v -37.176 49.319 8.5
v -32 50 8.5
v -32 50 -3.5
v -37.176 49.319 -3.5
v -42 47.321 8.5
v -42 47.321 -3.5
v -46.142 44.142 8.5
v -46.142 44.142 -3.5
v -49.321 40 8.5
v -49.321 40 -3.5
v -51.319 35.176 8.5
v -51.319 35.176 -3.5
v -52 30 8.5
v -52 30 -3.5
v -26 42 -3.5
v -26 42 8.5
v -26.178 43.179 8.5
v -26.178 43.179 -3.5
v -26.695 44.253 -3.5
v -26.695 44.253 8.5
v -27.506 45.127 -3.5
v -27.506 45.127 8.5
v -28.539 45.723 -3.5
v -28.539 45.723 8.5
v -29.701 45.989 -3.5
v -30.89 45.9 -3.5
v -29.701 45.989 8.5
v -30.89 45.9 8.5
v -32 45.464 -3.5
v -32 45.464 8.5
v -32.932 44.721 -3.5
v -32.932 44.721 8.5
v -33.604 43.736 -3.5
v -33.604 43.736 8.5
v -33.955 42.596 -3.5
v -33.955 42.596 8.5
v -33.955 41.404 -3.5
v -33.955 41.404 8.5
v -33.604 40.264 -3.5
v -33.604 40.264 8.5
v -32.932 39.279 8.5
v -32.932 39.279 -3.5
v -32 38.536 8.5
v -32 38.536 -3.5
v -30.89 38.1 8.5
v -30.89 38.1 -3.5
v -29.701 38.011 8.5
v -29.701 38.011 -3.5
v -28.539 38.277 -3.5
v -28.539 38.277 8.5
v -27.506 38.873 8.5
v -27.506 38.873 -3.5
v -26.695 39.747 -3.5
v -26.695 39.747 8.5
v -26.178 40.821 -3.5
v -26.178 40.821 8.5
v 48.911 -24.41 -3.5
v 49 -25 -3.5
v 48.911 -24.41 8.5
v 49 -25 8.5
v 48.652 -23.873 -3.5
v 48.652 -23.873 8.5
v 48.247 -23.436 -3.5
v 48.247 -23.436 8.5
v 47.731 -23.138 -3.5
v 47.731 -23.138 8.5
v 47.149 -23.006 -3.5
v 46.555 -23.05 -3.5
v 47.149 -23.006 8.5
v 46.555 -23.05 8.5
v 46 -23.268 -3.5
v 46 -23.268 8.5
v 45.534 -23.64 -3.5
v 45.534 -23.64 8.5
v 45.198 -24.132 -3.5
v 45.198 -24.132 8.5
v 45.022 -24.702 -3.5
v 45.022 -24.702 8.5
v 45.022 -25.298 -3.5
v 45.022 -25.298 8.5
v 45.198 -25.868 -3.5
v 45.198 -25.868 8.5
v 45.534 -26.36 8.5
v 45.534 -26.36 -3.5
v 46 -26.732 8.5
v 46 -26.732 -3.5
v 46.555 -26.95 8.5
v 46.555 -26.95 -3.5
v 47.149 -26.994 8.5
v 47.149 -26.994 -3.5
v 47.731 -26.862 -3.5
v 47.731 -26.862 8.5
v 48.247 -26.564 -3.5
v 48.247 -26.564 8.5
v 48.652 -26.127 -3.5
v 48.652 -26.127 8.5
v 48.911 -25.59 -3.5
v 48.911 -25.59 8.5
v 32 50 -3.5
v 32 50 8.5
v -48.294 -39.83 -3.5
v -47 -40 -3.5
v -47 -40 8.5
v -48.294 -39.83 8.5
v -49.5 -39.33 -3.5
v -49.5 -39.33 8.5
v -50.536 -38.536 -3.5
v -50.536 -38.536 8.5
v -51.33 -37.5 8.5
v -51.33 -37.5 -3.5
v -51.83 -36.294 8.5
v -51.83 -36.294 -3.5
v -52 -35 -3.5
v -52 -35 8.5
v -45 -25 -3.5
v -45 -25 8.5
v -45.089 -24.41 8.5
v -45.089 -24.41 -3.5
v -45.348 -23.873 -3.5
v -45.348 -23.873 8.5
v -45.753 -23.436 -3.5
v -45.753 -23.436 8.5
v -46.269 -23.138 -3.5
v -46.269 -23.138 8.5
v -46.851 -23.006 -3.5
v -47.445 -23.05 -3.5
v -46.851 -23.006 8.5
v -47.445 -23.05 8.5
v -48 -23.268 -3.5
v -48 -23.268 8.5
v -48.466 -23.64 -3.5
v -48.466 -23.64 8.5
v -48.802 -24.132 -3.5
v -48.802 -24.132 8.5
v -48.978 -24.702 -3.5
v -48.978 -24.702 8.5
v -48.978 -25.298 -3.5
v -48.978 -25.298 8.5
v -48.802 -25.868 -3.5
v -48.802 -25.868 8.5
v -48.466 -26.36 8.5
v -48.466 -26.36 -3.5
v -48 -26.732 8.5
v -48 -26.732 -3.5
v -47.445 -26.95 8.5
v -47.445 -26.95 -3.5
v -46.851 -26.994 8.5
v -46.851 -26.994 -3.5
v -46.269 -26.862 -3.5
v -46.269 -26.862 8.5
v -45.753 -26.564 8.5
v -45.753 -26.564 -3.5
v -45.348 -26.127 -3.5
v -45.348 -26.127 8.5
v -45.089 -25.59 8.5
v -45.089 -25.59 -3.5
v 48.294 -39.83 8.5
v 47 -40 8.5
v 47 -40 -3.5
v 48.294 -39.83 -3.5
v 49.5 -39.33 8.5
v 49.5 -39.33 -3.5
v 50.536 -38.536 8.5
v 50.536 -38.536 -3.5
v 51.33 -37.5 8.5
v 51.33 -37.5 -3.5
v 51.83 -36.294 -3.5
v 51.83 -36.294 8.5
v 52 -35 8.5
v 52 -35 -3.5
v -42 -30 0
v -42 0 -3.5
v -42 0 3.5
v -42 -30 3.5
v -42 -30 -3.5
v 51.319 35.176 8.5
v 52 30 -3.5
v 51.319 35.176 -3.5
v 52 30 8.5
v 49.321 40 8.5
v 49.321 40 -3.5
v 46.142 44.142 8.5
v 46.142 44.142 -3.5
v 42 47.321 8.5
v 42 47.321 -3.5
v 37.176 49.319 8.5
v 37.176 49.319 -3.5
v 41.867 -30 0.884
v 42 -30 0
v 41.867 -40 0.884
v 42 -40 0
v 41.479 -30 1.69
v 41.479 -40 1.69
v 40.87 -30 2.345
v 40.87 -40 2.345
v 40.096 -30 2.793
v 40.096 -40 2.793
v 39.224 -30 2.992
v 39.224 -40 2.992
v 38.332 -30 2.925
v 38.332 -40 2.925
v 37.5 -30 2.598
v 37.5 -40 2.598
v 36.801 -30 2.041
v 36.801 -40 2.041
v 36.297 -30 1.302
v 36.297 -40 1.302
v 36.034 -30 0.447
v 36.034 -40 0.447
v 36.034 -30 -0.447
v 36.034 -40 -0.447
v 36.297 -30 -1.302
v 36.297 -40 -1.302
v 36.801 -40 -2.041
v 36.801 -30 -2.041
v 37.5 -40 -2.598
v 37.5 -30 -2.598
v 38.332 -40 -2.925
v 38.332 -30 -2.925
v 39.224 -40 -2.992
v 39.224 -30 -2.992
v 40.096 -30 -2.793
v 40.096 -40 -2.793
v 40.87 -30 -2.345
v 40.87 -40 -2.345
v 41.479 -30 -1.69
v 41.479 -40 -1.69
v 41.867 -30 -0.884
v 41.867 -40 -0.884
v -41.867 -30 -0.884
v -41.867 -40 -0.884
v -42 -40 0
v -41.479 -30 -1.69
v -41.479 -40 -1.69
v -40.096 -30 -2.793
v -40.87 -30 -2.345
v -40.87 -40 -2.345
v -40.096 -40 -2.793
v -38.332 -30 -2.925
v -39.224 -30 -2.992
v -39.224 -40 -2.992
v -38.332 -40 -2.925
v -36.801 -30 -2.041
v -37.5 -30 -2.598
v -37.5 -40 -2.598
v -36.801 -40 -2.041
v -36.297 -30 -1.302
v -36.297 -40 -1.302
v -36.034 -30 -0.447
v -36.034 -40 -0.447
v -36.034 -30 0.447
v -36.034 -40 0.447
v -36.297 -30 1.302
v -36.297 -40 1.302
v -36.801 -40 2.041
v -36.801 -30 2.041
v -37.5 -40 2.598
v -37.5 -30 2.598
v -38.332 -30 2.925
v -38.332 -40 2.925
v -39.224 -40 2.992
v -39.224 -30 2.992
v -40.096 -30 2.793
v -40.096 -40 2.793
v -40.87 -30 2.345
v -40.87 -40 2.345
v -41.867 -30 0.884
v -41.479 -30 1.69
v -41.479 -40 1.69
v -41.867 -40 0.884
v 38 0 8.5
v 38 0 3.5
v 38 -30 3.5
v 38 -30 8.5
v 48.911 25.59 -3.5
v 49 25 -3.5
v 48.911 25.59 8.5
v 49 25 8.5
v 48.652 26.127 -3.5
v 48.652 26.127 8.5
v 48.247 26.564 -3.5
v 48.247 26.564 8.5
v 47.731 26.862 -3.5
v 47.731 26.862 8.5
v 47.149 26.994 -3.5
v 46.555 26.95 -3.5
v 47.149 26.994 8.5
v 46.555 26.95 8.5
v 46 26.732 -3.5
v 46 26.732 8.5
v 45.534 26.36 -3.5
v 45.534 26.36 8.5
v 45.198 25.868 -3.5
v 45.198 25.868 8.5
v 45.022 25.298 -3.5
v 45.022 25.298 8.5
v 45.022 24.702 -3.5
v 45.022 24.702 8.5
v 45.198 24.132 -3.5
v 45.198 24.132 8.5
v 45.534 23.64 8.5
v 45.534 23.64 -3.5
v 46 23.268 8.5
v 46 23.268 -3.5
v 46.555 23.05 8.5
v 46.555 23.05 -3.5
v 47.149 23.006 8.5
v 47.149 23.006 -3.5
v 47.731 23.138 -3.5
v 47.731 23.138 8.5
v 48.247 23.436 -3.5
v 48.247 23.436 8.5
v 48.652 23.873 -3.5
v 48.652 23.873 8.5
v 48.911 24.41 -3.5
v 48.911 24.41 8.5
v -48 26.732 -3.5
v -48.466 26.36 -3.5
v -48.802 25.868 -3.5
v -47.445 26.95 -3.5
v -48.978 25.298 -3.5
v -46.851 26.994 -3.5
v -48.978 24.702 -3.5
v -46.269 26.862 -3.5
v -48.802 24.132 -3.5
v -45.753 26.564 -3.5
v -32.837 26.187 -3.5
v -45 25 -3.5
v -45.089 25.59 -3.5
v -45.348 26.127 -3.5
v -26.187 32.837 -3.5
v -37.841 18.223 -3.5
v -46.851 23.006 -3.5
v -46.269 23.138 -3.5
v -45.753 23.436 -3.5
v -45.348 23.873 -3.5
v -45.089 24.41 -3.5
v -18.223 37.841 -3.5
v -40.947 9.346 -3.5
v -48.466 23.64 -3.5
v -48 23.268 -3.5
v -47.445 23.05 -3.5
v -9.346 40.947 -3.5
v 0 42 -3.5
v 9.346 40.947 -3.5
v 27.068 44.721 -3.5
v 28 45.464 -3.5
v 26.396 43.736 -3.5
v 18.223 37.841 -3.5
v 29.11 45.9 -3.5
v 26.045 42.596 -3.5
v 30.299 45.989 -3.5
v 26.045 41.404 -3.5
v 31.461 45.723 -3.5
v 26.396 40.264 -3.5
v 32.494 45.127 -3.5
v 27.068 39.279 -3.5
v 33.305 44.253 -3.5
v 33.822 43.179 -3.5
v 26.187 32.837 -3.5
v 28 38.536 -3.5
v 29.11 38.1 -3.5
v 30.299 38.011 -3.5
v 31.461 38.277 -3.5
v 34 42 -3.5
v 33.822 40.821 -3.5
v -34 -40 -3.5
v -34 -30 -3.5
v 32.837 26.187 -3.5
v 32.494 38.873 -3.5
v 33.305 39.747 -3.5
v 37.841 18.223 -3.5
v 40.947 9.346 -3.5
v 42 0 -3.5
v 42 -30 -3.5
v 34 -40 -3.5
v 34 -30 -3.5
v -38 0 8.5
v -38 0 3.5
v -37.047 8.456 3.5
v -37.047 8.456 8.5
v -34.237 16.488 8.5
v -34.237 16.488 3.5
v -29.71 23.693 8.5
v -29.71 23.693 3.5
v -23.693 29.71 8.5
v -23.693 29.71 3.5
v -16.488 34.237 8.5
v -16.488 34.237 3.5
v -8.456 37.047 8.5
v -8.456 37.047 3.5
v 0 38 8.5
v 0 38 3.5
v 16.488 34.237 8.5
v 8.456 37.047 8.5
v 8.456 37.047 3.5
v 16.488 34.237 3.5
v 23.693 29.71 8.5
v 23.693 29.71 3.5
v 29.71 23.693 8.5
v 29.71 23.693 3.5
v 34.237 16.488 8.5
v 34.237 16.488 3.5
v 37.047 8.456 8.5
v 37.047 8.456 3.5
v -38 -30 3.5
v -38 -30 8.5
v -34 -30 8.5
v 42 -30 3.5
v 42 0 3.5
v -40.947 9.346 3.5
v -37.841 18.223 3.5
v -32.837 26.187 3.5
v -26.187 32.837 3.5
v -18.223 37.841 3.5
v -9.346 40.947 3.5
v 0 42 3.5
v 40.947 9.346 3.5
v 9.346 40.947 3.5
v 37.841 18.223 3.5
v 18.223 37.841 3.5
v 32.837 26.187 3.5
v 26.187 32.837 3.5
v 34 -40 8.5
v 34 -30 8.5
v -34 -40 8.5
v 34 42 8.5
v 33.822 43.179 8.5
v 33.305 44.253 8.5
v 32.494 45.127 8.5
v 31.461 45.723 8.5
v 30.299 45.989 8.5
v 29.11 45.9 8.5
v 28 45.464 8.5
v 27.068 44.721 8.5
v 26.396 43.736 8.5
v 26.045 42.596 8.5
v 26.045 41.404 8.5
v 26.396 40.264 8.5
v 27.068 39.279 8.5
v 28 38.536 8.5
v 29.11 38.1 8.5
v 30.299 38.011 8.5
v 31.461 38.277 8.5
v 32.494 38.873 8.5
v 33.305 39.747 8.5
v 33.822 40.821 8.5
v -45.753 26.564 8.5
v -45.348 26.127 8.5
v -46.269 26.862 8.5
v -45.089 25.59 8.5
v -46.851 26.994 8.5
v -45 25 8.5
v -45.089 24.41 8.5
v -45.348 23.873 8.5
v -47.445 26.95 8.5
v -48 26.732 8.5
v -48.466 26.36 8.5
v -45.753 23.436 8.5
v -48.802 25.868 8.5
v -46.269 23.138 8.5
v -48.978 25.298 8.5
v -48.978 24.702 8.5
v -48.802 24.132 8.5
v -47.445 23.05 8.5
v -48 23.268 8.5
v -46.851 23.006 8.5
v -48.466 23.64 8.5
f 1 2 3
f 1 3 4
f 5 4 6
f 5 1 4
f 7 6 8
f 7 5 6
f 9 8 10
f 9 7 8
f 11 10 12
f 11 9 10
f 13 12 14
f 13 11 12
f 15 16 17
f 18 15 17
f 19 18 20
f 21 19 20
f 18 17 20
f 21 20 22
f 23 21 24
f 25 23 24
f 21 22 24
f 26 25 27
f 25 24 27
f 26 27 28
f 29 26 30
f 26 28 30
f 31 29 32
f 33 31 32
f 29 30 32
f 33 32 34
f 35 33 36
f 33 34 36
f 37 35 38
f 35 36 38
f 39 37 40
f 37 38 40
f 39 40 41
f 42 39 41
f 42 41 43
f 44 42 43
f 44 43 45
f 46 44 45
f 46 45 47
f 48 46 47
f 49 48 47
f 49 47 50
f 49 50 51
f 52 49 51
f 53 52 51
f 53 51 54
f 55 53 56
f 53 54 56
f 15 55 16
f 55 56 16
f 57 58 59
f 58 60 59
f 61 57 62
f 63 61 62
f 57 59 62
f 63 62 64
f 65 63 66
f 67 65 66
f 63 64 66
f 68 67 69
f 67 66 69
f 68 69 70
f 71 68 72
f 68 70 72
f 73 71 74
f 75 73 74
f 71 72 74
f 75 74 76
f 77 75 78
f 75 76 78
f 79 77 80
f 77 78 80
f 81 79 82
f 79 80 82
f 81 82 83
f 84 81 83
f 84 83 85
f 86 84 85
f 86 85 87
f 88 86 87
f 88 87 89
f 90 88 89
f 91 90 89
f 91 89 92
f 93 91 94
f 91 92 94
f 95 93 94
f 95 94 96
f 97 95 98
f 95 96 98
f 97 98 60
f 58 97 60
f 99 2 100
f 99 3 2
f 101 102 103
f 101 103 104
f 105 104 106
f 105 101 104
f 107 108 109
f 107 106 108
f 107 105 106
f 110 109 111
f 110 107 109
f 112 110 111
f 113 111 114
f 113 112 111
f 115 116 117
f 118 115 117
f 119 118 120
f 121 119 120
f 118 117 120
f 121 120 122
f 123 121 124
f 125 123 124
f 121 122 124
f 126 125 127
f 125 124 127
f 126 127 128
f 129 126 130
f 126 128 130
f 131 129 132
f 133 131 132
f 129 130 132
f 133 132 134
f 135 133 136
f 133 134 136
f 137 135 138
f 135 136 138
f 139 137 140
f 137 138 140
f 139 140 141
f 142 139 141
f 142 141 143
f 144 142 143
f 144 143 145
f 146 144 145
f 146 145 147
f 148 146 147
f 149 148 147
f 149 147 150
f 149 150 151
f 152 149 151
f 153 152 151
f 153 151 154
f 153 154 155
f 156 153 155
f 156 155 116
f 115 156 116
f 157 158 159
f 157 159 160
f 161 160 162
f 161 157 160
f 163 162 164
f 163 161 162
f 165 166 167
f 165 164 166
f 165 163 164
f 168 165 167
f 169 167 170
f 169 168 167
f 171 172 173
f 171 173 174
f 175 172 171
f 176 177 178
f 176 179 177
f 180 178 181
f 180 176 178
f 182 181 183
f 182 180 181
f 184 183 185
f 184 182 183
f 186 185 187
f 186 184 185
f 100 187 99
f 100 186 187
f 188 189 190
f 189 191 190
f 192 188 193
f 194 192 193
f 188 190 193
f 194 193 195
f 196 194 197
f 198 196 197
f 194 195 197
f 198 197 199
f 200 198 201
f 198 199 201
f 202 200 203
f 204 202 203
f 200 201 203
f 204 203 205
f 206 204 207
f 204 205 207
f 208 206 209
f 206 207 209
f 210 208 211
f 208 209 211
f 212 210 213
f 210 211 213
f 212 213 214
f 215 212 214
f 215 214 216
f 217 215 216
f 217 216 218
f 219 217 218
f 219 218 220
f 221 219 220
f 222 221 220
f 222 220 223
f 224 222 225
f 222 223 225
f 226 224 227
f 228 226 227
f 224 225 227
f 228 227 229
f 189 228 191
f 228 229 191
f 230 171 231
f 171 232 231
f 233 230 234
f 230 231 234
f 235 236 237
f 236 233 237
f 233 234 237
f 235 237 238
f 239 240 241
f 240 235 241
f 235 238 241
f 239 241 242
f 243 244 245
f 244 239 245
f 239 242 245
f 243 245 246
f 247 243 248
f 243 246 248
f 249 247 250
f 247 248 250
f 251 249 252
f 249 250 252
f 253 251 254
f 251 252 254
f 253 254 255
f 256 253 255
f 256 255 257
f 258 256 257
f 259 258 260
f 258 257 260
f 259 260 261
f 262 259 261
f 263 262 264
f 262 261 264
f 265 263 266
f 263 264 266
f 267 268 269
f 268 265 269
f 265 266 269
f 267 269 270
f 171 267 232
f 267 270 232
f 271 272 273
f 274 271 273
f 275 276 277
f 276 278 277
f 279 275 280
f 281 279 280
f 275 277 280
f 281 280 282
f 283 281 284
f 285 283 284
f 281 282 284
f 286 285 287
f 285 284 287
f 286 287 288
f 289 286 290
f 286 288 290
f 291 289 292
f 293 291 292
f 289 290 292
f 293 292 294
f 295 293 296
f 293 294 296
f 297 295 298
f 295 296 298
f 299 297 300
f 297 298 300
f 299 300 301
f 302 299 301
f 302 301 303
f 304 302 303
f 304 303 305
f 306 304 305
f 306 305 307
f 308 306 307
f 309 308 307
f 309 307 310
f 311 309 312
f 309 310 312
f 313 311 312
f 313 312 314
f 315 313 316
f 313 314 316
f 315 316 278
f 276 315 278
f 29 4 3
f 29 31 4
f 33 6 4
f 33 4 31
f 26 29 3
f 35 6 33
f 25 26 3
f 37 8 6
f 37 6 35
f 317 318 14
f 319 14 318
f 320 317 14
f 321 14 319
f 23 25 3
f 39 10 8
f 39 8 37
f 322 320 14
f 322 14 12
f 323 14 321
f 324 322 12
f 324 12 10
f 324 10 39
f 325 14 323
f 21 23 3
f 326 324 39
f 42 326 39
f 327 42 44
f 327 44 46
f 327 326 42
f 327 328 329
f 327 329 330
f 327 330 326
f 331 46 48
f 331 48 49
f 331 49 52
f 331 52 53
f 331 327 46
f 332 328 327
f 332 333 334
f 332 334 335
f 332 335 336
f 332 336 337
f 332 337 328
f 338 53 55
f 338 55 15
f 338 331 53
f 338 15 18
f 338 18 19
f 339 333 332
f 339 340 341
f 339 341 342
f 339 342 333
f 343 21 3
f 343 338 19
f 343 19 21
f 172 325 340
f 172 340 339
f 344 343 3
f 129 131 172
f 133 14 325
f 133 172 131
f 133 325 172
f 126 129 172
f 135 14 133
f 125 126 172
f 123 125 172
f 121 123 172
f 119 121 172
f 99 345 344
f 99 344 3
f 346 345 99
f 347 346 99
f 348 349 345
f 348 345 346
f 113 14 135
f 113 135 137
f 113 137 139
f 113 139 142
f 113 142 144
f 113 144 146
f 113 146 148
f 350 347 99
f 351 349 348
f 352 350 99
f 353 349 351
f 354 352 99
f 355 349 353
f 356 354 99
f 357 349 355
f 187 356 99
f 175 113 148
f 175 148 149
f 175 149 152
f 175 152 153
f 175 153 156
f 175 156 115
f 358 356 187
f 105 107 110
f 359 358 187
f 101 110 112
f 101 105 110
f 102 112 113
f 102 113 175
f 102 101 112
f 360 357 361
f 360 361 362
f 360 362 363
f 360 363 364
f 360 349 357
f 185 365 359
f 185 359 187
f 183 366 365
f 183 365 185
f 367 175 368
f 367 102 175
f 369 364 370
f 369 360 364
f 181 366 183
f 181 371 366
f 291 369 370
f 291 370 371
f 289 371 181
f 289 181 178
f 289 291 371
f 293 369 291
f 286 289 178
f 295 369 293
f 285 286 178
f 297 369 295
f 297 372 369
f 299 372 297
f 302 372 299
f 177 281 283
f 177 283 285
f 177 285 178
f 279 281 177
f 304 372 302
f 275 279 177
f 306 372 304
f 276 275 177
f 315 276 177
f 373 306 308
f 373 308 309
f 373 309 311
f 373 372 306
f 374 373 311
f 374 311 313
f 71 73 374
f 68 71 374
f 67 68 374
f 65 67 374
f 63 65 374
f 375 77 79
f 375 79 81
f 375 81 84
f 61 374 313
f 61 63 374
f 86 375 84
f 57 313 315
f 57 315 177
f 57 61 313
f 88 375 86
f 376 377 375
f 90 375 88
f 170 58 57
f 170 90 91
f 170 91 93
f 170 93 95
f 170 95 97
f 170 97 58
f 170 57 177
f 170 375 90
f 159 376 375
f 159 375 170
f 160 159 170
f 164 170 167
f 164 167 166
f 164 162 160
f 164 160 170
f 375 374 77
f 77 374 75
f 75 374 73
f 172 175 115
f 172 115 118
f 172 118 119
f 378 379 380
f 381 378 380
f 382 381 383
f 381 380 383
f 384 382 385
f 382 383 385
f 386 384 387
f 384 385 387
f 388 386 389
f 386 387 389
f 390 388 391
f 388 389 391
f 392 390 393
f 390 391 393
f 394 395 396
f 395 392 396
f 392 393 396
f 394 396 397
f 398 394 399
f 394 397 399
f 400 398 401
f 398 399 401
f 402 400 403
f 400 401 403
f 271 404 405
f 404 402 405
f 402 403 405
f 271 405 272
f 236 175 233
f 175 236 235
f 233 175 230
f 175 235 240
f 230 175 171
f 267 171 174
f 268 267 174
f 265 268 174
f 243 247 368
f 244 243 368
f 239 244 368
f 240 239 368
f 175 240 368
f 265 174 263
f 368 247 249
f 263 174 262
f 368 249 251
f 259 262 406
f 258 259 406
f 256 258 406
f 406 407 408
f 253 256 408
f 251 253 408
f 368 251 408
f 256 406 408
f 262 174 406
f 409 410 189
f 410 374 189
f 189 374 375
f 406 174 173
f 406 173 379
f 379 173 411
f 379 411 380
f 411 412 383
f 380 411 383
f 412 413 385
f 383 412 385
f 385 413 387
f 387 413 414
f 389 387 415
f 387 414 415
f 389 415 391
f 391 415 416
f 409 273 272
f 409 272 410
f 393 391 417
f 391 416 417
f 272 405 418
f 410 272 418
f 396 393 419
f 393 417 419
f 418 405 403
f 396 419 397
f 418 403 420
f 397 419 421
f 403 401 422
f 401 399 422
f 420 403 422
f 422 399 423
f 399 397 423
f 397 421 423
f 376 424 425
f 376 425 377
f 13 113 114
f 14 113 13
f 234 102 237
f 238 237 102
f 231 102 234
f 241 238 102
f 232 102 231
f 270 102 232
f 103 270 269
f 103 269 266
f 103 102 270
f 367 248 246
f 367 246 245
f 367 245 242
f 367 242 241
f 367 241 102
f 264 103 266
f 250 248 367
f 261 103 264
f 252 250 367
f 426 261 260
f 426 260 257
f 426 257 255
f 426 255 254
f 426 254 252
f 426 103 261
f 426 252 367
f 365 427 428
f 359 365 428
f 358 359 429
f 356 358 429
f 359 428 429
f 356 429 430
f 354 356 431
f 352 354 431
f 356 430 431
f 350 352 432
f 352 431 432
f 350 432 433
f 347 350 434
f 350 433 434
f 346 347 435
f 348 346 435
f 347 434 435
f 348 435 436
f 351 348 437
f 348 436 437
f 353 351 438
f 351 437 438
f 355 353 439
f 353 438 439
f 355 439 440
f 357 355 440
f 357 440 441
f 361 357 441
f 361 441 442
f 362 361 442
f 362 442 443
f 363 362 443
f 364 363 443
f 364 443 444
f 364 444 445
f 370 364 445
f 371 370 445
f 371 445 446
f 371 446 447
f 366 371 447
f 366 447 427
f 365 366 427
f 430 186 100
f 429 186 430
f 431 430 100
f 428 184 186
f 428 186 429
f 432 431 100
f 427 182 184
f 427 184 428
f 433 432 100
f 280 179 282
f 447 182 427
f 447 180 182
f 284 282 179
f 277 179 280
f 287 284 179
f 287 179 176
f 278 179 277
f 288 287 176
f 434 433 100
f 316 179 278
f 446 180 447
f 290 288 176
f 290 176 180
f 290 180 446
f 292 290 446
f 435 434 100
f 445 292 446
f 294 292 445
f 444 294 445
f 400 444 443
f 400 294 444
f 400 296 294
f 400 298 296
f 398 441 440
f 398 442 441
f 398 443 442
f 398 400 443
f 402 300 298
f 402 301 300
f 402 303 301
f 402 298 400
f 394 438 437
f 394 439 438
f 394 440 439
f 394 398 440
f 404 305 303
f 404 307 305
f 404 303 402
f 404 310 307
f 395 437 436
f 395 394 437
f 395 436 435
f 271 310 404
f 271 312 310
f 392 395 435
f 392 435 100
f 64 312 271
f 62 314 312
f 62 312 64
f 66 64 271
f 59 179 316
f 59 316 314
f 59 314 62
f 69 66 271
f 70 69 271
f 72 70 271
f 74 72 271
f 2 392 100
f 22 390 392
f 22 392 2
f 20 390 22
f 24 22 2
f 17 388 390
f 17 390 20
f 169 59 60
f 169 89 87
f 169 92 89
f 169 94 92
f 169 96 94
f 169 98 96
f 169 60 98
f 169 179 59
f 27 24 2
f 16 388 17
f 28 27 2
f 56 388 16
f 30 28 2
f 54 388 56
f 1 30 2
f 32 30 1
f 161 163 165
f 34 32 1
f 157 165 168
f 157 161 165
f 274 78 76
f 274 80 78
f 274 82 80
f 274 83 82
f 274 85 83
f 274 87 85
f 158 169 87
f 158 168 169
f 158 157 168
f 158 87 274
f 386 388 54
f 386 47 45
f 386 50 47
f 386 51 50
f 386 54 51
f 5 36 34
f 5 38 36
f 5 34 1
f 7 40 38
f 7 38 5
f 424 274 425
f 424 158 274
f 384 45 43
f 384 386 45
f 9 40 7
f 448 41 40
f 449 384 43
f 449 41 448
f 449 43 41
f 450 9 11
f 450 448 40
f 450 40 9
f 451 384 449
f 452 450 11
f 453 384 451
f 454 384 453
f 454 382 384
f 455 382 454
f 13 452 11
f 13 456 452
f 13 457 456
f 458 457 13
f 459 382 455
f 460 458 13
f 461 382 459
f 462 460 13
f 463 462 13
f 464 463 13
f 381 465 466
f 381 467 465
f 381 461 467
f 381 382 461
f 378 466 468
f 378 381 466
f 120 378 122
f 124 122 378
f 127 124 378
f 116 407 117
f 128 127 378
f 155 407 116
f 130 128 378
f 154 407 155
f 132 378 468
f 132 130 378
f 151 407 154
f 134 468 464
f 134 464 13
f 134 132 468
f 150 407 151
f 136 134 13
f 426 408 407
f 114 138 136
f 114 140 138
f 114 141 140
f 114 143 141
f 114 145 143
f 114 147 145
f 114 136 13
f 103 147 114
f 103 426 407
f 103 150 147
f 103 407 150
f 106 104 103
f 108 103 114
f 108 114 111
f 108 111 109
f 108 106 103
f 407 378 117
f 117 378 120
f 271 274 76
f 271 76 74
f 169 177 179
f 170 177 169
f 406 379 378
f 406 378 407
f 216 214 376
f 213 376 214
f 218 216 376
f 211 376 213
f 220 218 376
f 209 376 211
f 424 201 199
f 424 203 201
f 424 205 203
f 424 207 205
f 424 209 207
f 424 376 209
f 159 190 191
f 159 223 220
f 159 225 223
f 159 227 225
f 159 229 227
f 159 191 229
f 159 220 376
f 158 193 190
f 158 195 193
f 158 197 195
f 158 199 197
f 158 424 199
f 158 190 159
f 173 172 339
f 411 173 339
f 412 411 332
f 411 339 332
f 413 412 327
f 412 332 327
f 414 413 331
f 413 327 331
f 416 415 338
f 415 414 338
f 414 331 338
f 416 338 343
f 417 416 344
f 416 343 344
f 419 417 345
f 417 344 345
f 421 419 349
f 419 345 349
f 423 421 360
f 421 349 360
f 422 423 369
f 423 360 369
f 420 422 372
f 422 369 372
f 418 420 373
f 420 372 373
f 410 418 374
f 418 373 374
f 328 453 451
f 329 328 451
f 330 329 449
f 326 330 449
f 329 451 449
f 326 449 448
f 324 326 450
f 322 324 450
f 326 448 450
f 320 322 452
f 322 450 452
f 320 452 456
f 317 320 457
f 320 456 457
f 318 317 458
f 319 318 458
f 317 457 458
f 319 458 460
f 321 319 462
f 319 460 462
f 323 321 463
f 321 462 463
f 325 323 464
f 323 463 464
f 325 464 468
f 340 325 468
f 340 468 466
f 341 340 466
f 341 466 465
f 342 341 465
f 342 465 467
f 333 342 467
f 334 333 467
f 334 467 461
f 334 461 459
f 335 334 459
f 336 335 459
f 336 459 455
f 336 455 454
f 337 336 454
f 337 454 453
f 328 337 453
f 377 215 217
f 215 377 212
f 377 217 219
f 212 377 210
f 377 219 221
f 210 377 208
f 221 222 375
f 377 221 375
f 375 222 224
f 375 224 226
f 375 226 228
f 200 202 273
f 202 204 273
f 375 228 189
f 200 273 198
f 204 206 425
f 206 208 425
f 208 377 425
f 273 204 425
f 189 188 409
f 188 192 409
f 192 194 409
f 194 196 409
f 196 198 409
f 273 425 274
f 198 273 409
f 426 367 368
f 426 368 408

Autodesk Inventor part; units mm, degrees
ref_plane "YZ Plane" through (0, 0, 0) normal (1, 0, 0) x (0, 1, 0)
ref_plane "XZ Plane" through (0, 0, 0) normal (0, 1, 0) x (-1, 0, 0)
ref_plane "XY Plane" through (0, 0, 0) normal (0, 0, 1) x (1, 0, 0)
sketch "Sketch1" plane through (0, 0, 0) normal (0, 0, 1) x (1, 0, 0)
  circle A0 centre (0, 0) radius 4
  circle A1 centre (0, 0) radius 40 construction
  circle A2 centre (0, 0) radius 42 construction
  arc A3 (42, 0) -> (-42, 0) centre (0, 0) ccw
  line L0 (-42, 0) -> (-52, 0)
  line L1 (-52, 0) -> (-52, 50)
  line L2 (-52, 50) -> (52, 50)
  line L3 (52, 50) -> (52, 0)
  line L4 (52, 0) -> (42, 0)
  line L5 (-52, 0) -> (-42, 0)
  line L6 (-42, 0) -> (-42, -40)
  line L7 (-42, -40) -> (-52, -40)
  line L8 (-52, -40) -> (-52, 0)
  line L9 (52, 0) -> (42, 0)
  line L10 (42, 0) -> (42, -40)
  line L11 (42, -40) -> (52, -40)
  line L12 (52, -40) -> (52, 0)
  dimension "d0" = 8
  dimension "d1" = 80
  dimension "d2" = 2
  dimension "d3" = 50
  dimension "d4" = 10
  dimension "d5" = 40
extrude "Extrusion1" add sketch "Sketch1" along normal mid plane 7 contours A3 L0 L1 L2 L3 L4 | L4 L12 L11 L10 | L6 L7 L8 L0
sketch "Sketch2" plane through (0, 0, 3.5) normal (0, 0, 1) x (1, 0, 0)
  line L0 (42, 0) -> (42, -40) projected
  line L1 (42, -40) -> (52, -40) projected
  line L2 (52, -40) -> (52, 50) projected
  line L3 (52, 50) -> (-52, 50) projected
  line L4 (-52, 50) -> (-52, -40) projected
  line L5 (-52, -40) -> (-42, -40) projected
  line L6 (-42, -40) -> (-42, 0) projected
  arc A0 (42, 0) -> (-42, 0) centre (0, 0) ccw projected
  arc A1 (38, 0) -> (-38, 0) centre (0, 0) ccw
  line L7 (-38, 0) -> (-38, -40)
  line L8 (-38, -40) -> (-42, -40)
  line L9 (38, 0) -> (38, -40)
  line L10 (42, -40) -> (52, -40) projected
  line L11 (38, -40) -> (42, -40)
  dimension "d11" = 76
extrude "Extrusion2" add sketch "Sketch2" along normal blind 5
sketch "Sketch3" plane through (0, 0, 8.5) normal (0, 0, 1) x (1, 0, 0)
  line L0 (47, -25) -> (-47, -25) construction
  line L1 (-47, -25) -> (-47, 25) construction
  line L2 (-47, 25) -> (47, 25) construction
  line L3 (47, 25) -> (47, -25) construction
  line L4 (47, -25) -> (-47, 25) construction
  line L5 (-47, -25) -> (47, 25) construction
  arc A0 (42, 0) -> (-42, 0) centre (0, 0) ccw construction
  line L6 (-42, -40) -> (-42, 0) construction
  line L7 (42, 0) -> (42, -40) construction
  circle A1 centre (-47, 25) radius 2
  circle A2 centre (-47, -25) radius 2
  circle A3 centre (47, -25) radius 2
  circle A4 centre (47, 25) radius 2
  dimension "d12" = 4
  dimension "d13" = 5
  dimension "d14" = 50
extrude "Extrusion3" cut sketch "Sketch3" against normal through all
sketch "Sketch4" plane through (0, 0, 8.5) normal (0, 0, 1) x (1, 0, 0)
  circle A0 centre (-30, 42) radius 4 projected
  circle A1 centre (30, 42) radius 4 projected
  point P0 (0, 0)
extrude "Extrusion4" cut sketch "Sketch4" against normal through all
sketch "Sketch5" plane through (42, -40, -3.5) normal (0, -1, 0) x (1, 0, 0)
  line L0 (10, 0) -> (10, 12) construction
  line L1 (-4, 12) -> (10, 12) construction
  line L2 (-4, 7) -> (-4, 12) projected
  line L3 (-4, 7) -> (0, 7) projected
  line L4 (0, 0) -> (0, 7) projected
  line L5 (10, 0) -> (0, 0) construction
  line L6 (0, 0) -> (0, 7) construction
  line L7 (0, 3.5) -> (-3, 3.5) construction
  circle A0 centre (-3, 3.5) radius 3
  line L8 (-4, 12) -> (-8, 12)
  line L9 (-80, 12) -> (-4, 12) projected
  line L10 (-8, 12) -> (-8, 0)
  line L11 (-8, 0) -> (0, 0)
  point P0 (-42, 3.5)
  dimension "d19" = 6
  dimension "d20" = 4
extrude "Extrusion5" add sketch "Sketch5" against normal blind 10
mirror "Mirror1" about plane through (0, 0, 0) normal (1, 0, 0) of "Extrusion5"
fillet "Fillet1" radius 20 2 edges at (52, 50, 2.5) (-52, 50, 2.5)
fillet "Fillet2" radius 5 2 edges at (52, -40, 2.5) (-52, -40, 2.5)
properties part number "frame top"
